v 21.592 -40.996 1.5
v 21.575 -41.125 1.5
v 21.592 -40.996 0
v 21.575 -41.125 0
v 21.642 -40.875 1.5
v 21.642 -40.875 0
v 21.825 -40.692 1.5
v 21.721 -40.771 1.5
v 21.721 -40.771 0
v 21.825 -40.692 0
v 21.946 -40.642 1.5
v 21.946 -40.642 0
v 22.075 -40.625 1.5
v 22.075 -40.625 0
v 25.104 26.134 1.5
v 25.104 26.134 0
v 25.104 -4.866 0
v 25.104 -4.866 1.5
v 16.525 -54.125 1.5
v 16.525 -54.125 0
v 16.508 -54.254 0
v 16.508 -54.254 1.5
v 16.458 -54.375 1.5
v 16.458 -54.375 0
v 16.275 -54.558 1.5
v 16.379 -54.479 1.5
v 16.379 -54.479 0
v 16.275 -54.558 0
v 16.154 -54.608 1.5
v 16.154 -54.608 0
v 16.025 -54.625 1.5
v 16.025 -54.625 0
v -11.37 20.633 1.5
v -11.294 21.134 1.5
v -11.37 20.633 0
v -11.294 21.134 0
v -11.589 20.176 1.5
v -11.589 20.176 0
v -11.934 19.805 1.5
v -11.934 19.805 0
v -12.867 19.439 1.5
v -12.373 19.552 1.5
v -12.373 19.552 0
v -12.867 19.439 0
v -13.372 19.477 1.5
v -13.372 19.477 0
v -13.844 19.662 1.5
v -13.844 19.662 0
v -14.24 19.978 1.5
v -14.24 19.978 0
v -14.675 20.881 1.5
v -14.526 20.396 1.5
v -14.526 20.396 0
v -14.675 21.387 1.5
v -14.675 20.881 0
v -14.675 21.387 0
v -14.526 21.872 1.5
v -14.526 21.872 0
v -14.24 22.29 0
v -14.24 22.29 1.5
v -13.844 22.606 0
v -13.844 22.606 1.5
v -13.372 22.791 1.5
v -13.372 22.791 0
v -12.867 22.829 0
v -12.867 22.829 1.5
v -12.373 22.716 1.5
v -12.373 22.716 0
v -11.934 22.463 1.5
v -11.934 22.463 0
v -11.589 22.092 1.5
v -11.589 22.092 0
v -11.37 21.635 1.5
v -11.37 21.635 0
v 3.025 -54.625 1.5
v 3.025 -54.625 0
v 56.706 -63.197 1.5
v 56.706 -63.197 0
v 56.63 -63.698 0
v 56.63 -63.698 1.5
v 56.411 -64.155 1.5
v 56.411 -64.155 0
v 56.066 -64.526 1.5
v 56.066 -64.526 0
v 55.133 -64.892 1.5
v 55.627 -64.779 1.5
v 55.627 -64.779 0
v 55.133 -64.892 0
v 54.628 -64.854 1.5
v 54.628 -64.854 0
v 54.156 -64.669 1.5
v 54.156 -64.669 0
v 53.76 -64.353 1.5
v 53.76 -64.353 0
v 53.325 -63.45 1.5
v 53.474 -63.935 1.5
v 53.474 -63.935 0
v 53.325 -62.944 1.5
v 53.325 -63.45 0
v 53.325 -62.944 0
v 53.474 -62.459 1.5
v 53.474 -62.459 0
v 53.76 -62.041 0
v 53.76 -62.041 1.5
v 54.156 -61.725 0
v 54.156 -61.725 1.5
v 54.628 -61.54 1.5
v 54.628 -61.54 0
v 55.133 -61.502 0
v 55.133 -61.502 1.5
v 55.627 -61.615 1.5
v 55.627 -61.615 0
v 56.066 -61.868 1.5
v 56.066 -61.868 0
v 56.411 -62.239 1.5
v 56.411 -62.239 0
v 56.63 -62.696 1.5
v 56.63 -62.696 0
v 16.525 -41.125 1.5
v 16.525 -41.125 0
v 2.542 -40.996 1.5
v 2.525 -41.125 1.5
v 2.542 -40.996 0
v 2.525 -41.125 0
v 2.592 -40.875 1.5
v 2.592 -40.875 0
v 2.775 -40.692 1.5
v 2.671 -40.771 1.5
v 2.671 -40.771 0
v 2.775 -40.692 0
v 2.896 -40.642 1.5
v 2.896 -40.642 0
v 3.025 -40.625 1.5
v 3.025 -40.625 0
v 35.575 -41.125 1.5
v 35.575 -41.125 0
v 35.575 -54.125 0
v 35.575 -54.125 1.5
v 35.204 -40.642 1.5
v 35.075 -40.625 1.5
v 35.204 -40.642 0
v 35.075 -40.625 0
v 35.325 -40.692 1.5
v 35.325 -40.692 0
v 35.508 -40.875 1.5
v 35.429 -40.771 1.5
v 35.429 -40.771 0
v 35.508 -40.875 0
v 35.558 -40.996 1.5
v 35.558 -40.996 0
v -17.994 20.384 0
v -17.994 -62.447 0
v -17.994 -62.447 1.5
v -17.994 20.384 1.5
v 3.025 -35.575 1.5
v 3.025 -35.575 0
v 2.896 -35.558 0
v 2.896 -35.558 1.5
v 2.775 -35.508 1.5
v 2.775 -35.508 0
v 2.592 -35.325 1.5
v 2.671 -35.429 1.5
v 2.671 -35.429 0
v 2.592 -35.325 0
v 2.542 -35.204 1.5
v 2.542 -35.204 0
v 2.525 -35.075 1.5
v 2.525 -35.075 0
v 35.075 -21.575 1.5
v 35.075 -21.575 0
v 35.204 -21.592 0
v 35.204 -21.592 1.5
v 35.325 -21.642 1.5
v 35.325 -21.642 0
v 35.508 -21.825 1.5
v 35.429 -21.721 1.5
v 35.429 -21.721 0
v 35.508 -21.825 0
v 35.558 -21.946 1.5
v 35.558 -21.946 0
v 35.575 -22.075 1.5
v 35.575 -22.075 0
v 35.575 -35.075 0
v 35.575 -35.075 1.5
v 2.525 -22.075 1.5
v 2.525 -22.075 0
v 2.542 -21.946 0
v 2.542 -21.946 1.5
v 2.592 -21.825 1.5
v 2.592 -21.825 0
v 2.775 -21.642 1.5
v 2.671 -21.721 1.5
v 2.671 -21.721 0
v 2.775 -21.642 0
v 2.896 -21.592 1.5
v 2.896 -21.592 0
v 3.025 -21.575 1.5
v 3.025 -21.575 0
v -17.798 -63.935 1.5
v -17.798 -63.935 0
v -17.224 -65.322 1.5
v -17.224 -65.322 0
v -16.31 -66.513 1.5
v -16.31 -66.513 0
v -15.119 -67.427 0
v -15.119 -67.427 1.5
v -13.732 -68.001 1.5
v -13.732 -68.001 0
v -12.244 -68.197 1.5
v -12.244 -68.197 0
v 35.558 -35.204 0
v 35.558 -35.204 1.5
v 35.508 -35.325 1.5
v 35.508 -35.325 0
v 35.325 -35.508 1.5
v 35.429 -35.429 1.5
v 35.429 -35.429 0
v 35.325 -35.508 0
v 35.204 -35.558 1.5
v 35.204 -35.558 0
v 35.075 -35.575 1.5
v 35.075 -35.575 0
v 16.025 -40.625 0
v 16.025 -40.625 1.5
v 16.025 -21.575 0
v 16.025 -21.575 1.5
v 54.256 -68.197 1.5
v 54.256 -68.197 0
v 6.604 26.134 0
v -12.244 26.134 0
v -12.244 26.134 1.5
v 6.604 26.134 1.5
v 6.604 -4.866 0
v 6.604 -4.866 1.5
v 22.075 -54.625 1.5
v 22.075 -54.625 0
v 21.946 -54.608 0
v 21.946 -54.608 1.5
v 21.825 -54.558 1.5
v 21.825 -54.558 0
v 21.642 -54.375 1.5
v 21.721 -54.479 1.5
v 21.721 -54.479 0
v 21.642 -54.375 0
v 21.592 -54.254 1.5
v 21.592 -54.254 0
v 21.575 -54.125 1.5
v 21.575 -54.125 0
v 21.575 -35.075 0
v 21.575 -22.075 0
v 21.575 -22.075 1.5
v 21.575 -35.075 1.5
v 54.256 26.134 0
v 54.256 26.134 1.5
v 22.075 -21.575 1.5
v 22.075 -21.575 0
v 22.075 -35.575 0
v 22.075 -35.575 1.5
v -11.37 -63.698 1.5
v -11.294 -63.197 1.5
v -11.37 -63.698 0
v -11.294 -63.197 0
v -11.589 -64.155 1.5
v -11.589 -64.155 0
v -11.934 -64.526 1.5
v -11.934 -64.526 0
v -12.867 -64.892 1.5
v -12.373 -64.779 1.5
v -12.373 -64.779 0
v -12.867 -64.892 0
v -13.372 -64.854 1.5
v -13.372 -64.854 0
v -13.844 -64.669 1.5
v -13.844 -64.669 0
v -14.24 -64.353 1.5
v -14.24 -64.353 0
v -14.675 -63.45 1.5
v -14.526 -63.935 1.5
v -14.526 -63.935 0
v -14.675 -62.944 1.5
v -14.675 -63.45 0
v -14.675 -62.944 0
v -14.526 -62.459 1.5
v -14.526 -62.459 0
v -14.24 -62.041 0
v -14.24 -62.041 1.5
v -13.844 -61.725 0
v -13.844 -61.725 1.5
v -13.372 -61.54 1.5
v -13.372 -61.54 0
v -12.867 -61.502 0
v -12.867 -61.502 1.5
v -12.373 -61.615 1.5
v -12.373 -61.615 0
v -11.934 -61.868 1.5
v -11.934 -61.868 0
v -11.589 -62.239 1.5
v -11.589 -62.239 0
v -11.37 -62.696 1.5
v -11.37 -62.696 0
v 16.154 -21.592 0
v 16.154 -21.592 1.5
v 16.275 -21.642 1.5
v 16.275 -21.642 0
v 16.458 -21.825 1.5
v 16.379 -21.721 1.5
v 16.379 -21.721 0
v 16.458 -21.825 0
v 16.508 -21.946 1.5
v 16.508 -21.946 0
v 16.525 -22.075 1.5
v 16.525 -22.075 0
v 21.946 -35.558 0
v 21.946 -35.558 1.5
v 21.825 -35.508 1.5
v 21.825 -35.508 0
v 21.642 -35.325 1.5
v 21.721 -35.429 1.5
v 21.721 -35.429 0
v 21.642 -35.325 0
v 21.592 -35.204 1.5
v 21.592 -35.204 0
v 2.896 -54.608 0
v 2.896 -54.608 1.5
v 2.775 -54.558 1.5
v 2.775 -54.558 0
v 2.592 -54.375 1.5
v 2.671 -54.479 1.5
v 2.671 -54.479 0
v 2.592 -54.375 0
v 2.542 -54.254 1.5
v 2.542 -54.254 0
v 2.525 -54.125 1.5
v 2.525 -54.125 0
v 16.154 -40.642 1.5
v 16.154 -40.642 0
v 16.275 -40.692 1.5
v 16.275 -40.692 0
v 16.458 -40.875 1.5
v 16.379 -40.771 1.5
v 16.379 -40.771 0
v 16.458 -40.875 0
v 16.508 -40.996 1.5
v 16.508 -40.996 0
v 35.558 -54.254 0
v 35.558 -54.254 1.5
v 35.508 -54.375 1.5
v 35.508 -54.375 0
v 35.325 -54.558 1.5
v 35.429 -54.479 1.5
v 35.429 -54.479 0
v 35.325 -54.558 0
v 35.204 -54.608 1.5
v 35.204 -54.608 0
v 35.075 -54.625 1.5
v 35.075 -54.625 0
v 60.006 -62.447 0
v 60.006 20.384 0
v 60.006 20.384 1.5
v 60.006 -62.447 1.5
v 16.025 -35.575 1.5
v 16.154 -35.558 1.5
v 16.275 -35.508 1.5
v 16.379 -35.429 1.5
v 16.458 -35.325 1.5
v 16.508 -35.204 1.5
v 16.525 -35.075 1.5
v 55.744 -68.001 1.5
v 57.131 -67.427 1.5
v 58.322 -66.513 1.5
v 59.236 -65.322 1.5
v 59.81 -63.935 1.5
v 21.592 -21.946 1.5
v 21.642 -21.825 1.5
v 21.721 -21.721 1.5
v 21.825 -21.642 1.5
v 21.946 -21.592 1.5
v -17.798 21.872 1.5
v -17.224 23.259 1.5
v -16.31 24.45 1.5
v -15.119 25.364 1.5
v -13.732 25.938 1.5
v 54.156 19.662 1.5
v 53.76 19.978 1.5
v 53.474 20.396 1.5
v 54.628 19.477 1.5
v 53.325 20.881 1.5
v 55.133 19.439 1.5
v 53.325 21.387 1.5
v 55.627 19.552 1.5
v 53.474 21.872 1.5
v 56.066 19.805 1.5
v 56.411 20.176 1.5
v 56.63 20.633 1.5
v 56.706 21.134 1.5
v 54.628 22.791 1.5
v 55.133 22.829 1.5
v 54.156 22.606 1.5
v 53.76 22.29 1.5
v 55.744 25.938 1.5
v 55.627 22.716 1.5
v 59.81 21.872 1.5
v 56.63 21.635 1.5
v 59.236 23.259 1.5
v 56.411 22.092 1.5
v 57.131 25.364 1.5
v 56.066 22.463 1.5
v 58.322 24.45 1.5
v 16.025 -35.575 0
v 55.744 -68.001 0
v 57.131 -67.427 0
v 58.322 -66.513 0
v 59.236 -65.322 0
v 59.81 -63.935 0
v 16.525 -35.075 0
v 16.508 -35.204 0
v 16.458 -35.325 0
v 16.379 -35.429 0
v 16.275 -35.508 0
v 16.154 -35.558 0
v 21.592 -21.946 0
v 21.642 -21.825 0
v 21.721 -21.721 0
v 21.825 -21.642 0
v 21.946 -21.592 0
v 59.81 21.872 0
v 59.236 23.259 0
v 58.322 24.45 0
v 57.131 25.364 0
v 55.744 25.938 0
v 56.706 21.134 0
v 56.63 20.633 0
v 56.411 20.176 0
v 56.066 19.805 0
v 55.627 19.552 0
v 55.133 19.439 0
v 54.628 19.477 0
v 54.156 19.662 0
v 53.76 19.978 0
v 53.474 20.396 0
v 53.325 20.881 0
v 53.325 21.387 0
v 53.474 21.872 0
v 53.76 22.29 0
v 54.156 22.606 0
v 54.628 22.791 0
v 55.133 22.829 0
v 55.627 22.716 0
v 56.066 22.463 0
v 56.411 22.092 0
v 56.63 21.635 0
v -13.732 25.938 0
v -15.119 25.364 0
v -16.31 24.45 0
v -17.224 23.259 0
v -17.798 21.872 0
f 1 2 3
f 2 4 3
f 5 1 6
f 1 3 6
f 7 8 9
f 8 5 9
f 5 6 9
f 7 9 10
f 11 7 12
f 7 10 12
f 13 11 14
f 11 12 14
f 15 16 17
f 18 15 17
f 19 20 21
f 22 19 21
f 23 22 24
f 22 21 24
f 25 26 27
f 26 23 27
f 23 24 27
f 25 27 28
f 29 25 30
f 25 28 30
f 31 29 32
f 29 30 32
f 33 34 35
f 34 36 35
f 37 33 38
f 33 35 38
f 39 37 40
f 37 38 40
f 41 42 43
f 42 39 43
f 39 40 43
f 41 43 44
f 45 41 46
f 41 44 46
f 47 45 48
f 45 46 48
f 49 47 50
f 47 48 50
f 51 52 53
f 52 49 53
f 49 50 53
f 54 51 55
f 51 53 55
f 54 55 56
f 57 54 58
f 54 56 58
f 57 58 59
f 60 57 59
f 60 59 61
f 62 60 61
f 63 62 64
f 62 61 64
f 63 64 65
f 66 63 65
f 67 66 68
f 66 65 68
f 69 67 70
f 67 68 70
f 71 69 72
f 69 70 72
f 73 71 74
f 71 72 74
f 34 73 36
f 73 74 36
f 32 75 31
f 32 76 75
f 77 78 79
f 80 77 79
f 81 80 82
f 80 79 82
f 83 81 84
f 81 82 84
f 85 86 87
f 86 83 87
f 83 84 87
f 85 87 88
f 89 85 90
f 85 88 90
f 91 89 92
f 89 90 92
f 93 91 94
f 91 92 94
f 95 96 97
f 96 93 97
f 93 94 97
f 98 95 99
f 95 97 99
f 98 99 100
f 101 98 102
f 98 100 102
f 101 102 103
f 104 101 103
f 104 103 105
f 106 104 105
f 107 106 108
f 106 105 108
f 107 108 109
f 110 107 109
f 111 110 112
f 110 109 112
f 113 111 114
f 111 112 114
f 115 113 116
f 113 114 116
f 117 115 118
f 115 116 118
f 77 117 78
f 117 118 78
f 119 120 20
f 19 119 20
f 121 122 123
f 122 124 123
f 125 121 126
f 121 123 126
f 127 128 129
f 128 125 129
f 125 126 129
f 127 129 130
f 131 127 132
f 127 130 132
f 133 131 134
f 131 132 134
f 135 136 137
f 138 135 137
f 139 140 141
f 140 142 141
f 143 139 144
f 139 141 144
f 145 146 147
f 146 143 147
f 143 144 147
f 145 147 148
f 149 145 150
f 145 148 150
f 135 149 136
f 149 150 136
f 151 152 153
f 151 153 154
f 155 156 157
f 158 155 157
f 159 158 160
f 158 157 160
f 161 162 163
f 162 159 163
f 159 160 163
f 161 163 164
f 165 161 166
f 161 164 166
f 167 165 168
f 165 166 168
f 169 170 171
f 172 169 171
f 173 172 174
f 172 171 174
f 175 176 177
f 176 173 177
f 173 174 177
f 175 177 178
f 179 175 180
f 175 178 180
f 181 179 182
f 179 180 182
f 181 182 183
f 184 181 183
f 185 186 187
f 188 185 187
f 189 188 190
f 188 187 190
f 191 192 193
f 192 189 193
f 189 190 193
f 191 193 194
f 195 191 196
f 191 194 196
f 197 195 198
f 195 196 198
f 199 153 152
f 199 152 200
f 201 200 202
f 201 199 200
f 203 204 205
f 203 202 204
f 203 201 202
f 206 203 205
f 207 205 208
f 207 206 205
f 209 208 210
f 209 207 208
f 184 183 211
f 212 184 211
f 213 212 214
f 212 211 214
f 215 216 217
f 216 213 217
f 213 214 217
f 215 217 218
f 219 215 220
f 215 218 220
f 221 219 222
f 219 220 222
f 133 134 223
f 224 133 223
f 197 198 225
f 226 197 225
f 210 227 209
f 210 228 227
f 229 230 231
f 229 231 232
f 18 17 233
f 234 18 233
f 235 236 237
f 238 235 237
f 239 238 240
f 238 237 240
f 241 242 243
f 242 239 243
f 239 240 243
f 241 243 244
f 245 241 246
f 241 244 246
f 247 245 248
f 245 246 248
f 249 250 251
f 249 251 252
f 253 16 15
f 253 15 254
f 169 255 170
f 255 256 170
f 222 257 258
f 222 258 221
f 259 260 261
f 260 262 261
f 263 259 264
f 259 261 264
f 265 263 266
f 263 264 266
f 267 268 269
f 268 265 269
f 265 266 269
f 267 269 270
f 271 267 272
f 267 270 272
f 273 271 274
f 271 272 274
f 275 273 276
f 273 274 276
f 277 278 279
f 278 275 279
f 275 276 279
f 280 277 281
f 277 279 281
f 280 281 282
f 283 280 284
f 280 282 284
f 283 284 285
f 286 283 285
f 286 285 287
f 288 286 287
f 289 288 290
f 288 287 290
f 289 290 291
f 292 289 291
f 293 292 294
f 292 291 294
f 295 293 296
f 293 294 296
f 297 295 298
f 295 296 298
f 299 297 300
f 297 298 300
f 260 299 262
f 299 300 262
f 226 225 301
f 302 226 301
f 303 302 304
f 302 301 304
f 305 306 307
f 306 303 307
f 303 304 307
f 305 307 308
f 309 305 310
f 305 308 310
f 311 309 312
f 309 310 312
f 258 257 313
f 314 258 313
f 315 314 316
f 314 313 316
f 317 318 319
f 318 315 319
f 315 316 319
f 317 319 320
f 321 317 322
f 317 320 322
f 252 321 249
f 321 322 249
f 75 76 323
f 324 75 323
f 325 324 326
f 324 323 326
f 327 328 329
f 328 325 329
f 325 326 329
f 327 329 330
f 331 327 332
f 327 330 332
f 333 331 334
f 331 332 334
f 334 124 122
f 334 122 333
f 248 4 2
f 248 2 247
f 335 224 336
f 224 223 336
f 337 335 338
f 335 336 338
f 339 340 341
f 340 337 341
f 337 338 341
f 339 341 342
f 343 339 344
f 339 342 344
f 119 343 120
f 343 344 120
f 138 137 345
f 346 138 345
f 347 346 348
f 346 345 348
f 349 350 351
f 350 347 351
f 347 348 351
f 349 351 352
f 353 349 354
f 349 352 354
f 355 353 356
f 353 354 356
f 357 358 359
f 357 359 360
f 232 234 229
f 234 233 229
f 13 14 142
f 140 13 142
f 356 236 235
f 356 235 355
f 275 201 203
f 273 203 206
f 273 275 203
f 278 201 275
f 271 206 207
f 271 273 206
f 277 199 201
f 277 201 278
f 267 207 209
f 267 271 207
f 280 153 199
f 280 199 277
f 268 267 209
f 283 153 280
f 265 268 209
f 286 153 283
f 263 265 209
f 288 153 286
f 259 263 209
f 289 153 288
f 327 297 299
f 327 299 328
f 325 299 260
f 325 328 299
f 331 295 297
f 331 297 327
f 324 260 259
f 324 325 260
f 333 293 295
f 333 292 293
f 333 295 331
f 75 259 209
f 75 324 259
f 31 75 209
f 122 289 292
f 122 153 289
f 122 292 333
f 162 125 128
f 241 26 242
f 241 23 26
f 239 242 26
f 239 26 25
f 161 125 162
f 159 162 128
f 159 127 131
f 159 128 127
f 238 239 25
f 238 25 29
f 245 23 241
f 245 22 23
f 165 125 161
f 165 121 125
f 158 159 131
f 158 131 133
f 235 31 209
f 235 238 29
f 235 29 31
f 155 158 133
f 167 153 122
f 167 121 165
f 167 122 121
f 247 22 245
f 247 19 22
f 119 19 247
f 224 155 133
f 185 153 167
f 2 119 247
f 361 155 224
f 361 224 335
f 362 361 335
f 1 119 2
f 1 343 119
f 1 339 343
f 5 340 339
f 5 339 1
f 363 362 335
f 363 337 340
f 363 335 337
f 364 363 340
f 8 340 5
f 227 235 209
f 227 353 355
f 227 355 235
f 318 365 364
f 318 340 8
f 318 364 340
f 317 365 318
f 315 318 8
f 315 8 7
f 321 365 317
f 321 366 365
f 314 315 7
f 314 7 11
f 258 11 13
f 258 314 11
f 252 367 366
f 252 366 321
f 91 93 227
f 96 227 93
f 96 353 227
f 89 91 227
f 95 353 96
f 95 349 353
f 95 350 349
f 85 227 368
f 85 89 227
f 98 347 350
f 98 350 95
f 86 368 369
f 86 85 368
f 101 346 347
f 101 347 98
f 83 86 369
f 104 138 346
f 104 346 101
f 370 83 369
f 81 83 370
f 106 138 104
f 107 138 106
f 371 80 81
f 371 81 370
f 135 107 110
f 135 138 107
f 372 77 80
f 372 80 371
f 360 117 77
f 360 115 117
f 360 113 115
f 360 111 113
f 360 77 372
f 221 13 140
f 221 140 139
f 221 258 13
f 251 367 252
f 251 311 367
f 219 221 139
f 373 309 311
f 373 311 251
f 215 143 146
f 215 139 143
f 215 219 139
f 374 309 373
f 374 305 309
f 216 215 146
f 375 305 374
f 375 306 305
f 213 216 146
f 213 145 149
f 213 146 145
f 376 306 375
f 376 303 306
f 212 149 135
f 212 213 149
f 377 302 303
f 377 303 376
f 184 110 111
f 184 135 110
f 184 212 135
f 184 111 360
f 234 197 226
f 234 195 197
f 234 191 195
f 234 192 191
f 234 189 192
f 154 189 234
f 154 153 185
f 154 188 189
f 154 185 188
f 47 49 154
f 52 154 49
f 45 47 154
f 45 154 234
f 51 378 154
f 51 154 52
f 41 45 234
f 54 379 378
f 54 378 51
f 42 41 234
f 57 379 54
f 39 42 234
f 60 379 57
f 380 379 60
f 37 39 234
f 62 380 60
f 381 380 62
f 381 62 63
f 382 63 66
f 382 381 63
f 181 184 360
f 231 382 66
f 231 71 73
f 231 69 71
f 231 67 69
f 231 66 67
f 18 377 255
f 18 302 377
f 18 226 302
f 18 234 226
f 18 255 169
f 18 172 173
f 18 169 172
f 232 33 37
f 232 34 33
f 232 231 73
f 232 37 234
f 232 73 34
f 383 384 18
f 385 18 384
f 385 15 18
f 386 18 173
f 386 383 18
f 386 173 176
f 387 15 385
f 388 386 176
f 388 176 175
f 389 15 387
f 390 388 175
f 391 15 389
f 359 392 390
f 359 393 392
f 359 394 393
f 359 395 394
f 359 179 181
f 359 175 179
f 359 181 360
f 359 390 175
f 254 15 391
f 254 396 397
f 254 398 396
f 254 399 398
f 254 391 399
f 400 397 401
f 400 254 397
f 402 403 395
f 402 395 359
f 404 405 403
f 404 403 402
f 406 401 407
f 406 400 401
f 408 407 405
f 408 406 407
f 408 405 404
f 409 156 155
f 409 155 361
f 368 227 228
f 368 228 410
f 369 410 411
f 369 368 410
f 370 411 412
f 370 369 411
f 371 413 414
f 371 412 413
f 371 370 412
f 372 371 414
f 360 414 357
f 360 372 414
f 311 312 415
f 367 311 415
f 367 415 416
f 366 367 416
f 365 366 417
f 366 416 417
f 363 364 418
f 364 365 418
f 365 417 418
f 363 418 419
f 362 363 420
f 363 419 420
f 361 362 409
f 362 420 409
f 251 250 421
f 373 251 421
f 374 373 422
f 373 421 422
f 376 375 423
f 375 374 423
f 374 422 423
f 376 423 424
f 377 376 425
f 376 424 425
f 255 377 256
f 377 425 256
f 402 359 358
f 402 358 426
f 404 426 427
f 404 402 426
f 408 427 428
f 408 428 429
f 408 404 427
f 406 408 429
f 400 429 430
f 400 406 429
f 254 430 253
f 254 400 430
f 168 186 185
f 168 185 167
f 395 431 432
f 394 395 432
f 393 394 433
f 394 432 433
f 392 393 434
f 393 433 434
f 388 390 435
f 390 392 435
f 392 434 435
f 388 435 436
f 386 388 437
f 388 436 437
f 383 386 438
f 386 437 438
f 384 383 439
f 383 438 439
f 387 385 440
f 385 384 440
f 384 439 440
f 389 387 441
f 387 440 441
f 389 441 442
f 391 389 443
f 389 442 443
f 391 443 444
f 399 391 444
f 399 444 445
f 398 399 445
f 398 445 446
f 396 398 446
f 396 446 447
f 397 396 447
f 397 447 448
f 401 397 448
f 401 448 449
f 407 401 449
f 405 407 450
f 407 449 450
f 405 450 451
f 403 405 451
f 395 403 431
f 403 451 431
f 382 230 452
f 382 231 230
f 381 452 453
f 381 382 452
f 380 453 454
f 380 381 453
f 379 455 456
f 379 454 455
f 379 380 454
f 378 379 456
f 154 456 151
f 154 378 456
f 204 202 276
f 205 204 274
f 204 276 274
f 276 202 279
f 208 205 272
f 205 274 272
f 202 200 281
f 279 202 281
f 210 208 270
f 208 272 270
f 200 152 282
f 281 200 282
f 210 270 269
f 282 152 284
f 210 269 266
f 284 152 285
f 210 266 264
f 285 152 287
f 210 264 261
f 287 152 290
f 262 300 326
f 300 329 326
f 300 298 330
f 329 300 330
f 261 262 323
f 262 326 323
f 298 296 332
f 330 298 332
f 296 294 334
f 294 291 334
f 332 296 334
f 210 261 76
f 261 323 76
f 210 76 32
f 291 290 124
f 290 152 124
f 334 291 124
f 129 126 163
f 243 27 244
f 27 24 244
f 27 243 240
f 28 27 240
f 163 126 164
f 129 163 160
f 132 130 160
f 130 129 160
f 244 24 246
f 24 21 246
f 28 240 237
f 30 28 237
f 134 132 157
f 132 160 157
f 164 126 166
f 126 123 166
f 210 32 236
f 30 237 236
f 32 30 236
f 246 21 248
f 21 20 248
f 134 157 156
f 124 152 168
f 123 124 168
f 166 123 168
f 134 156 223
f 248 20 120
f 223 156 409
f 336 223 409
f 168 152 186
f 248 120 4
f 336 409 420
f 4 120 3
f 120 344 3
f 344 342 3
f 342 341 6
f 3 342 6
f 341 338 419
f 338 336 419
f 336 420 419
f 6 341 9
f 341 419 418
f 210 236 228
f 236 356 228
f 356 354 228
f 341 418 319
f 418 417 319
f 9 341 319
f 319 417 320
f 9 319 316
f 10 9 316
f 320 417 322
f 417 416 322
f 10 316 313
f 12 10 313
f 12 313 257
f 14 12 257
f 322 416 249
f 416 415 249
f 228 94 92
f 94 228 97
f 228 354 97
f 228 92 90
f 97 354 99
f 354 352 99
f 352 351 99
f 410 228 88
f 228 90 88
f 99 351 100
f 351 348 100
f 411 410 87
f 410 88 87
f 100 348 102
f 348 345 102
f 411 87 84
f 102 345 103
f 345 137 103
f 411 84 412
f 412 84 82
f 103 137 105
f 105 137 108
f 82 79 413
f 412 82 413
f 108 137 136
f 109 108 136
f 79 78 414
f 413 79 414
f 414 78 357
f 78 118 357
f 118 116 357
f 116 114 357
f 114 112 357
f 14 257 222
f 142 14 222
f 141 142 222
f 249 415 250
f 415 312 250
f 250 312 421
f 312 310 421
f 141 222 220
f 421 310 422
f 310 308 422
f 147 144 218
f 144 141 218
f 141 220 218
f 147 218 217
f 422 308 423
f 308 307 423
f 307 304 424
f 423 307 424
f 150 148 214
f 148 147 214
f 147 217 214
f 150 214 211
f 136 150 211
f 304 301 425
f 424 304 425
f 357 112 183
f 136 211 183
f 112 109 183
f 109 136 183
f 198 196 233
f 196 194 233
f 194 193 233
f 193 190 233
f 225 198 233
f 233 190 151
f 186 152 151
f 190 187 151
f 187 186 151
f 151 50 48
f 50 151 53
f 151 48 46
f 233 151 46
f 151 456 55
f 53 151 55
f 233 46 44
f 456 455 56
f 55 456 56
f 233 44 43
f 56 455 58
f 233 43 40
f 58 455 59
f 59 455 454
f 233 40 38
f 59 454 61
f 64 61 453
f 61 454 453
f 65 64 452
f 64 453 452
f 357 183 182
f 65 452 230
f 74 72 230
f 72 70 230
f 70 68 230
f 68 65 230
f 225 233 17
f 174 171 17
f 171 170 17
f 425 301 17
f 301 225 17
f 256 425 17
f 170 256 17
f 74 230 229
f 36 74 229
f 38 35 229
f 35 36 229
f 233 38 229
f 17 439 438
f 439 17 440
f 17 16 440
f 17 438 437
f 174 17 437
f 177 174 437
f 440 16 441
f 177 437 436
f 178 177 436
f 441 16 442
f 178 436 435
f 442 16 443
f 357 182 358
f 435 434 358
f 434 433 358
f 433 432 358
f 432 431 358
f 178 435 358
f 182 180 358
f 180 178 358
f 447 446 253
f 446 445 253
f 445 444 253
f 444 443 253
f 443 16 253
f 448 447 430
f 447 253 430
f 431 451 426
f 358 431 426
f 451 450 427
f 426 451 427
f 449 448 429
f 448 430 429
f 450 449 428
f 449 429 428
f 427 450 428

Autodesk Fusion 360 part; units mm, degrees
sketch "plate-2025-12-04T13_16_58.583Z" plane through (0, 0, 0) normal (0, 0, 1) x (1, 0, 0)
  line L0 (3.025, -21.575) -> (16.025, -21.575)
  line L1 (3.025, -35.575) -> (16.025, -35.575)
  line L2 (2.525, -22.075) -> (2.525, -35.075)
  line L3 (16.525, -22.075) -> (16.525, -35.075)
  arc A0 (3.025, -21.575) -> (2.525, -22.075) centre (3.025, -22.075) ccw
  arc A1 (16.525, -22.075) -> (16.025, -21.575) centre (16.025, -22.075) ccw
  arc A2 (2.525, -35.075) -> (3.025, -35.575) centre (3.025, -35.075) ccw
  arc A3 (16.025, -35.575) -> (16.525, -35.075) centre (16.025, -35.075) ccw
  line L4 (22.075, -21.575) -> (35.075, -21.575)
  line L5 (22.075, -35.575) -> (35.075, -35.575)
  line L6 (21.575, -22.075) -> (21.575, -35.075)
  line L7 (35.575, -22.075) -> (35.575, -35.075)
  arc A4 (22.075, -21.575) -> (21.575, -22.075) centre (22.075, -22.075) ccw
  arc A5 (35.575, -22.075) -> (35.075, -21.575) centre (35.075, -22.075) ccw
  arc A6 (21.575, -35.075) -> (22.075, -35.575) centre (22.075, -35.075) ccw
  arc A7 (35.075, -35.575) -> (35.575, -35.075) centre (35.075, -35.075) ccw
  line L8 (3.025, -40.625) -> (16.025, -40.625)
  line L9 (3.025, -54.625) -> (16.025, -54.625)
  line L10 (2.525, -41.125) -> (2.525, -54.125)
  line L11 (16.525, -41.125) -> (16.525, -54.125)
  arc A8 (3.025, -40.625) -> (2.525, -41.125) centre (3.025, -41.125) ccw
  arc A9 (16.525, -41.125) -> (16.025, -40.625) centre (16.025, -41.125) ccw
  arc A10 (2.525, -54.125) -> (3.025, -54.625) centre (3.025, -54.125) ccw
  arc A11 (16.025, -54.625) -> (16.525, -54.125) centre (16.025, -54.125) ccw
  line L12 (22.075, -40.625) -> (35.075, -40.625)
  line L13 (22.075, -54.625) -> (35.075, -54.625)
  line L14 (21.575, -41.125) -> (21.575, -54.125)
  line L15 (35.575, -41.125) -> (35.575, -54.125)
  arc A12 (22.075, -40.625) -> (21.575, -41.125) centre (22.075, -41.125) ccw
  arc A13 (35.575, -41.125) -> (35.075, -40.625) centre (35.075, -41.125) ccw
  arc A14 (21.575, -54.125) -> (22.075, -54.625) centre (22.075, -54.125) ccw
  arc A15 (35.075, -54.625) -> (35.575, -54.125) centre (35.075, -54.125) ccw
  line L16 (0, -57.15) -> (38.1, -57.15)
  line L17 (0, -19.05) -> (38.1, -19.05)
  line L18 (0, -57.15) -> (0, -19.05)
  line L19 (38.1, -57.15) -> (38.1, -19.05)
  line L20 (-17.994, 26.134) -> (60.006, 26.134)
  line L21 (60.006, 26.134) -> (60.006, -68.197)
  line L22 (60.006, -68.197) -> (-17.994, -68.197)
  line L23 (-17.994, -68.197) -> (-17.994, 26.134)
  line L24 (6.604, 26.134) -> (25.104, 26.134)
  line L25 (25.104, 26.134) -> (25.104, -4.866)
  line L26 (25.104, -4.866) -> (6.604, -4.866)
  line L27 (6.604, -4.866) -> (6.604, 26.134)
  circle A16 centre (-12.994, 21.134) radius 1.7
  circle A17 centre (55.006, 21.134) radius 1.7
  circle A18 centre (-12.994, -63.197) radius 1.7
  circle A19 centre (55.006, -63.197) radius 1.7
  dimension "d1" = 78
  dimension "d2" = 94.331
  dimension "d4" = 20.519
  dimension "d5" = 13.572
  dimension "d6" = 18.5
  dimension "d7" = 31
  dimension "d8" = 24.598
  dimension "d9" = 3.4
  dimension "d10" = 5
  dimension "d11" = 5
  dimension "d12" = 3.4
  dimension "d13" = 5
  dimension "d14" = 5
  dimension "d15" = 3.4
  dimension "d16" = 5
  dimension "d17" = 5
  dimension "d18" = 3.4
  dimension "d19" = 5
  dimension "d20" = 5
extrude "Extrude1" add sketch "plate-2025-12-04T13_16_58.583Z" along normal blind 1.5 contours L16 L17 L18 L19 | L20 L21 L22 L23 L25 L26 L27
fillet "Fillet1" radius 5.75 1 edges at (60.006, -68.197, 0.75)
fillet "Fillet2" radius 5.75 1 edges at (-17.994, -68.197, 0.75)
fillet "Fillet3" radius 5.75 1 edges at (60.006, 26.134, 0.75)
fillet "Fillet4" radius 5.75 1 edges at (-17.994, 26.134, 0.75)
equation "d5 = 9.5 mm + 4.072 mm"
equation "d8 = 18.848 mm + 5.75 mm"
